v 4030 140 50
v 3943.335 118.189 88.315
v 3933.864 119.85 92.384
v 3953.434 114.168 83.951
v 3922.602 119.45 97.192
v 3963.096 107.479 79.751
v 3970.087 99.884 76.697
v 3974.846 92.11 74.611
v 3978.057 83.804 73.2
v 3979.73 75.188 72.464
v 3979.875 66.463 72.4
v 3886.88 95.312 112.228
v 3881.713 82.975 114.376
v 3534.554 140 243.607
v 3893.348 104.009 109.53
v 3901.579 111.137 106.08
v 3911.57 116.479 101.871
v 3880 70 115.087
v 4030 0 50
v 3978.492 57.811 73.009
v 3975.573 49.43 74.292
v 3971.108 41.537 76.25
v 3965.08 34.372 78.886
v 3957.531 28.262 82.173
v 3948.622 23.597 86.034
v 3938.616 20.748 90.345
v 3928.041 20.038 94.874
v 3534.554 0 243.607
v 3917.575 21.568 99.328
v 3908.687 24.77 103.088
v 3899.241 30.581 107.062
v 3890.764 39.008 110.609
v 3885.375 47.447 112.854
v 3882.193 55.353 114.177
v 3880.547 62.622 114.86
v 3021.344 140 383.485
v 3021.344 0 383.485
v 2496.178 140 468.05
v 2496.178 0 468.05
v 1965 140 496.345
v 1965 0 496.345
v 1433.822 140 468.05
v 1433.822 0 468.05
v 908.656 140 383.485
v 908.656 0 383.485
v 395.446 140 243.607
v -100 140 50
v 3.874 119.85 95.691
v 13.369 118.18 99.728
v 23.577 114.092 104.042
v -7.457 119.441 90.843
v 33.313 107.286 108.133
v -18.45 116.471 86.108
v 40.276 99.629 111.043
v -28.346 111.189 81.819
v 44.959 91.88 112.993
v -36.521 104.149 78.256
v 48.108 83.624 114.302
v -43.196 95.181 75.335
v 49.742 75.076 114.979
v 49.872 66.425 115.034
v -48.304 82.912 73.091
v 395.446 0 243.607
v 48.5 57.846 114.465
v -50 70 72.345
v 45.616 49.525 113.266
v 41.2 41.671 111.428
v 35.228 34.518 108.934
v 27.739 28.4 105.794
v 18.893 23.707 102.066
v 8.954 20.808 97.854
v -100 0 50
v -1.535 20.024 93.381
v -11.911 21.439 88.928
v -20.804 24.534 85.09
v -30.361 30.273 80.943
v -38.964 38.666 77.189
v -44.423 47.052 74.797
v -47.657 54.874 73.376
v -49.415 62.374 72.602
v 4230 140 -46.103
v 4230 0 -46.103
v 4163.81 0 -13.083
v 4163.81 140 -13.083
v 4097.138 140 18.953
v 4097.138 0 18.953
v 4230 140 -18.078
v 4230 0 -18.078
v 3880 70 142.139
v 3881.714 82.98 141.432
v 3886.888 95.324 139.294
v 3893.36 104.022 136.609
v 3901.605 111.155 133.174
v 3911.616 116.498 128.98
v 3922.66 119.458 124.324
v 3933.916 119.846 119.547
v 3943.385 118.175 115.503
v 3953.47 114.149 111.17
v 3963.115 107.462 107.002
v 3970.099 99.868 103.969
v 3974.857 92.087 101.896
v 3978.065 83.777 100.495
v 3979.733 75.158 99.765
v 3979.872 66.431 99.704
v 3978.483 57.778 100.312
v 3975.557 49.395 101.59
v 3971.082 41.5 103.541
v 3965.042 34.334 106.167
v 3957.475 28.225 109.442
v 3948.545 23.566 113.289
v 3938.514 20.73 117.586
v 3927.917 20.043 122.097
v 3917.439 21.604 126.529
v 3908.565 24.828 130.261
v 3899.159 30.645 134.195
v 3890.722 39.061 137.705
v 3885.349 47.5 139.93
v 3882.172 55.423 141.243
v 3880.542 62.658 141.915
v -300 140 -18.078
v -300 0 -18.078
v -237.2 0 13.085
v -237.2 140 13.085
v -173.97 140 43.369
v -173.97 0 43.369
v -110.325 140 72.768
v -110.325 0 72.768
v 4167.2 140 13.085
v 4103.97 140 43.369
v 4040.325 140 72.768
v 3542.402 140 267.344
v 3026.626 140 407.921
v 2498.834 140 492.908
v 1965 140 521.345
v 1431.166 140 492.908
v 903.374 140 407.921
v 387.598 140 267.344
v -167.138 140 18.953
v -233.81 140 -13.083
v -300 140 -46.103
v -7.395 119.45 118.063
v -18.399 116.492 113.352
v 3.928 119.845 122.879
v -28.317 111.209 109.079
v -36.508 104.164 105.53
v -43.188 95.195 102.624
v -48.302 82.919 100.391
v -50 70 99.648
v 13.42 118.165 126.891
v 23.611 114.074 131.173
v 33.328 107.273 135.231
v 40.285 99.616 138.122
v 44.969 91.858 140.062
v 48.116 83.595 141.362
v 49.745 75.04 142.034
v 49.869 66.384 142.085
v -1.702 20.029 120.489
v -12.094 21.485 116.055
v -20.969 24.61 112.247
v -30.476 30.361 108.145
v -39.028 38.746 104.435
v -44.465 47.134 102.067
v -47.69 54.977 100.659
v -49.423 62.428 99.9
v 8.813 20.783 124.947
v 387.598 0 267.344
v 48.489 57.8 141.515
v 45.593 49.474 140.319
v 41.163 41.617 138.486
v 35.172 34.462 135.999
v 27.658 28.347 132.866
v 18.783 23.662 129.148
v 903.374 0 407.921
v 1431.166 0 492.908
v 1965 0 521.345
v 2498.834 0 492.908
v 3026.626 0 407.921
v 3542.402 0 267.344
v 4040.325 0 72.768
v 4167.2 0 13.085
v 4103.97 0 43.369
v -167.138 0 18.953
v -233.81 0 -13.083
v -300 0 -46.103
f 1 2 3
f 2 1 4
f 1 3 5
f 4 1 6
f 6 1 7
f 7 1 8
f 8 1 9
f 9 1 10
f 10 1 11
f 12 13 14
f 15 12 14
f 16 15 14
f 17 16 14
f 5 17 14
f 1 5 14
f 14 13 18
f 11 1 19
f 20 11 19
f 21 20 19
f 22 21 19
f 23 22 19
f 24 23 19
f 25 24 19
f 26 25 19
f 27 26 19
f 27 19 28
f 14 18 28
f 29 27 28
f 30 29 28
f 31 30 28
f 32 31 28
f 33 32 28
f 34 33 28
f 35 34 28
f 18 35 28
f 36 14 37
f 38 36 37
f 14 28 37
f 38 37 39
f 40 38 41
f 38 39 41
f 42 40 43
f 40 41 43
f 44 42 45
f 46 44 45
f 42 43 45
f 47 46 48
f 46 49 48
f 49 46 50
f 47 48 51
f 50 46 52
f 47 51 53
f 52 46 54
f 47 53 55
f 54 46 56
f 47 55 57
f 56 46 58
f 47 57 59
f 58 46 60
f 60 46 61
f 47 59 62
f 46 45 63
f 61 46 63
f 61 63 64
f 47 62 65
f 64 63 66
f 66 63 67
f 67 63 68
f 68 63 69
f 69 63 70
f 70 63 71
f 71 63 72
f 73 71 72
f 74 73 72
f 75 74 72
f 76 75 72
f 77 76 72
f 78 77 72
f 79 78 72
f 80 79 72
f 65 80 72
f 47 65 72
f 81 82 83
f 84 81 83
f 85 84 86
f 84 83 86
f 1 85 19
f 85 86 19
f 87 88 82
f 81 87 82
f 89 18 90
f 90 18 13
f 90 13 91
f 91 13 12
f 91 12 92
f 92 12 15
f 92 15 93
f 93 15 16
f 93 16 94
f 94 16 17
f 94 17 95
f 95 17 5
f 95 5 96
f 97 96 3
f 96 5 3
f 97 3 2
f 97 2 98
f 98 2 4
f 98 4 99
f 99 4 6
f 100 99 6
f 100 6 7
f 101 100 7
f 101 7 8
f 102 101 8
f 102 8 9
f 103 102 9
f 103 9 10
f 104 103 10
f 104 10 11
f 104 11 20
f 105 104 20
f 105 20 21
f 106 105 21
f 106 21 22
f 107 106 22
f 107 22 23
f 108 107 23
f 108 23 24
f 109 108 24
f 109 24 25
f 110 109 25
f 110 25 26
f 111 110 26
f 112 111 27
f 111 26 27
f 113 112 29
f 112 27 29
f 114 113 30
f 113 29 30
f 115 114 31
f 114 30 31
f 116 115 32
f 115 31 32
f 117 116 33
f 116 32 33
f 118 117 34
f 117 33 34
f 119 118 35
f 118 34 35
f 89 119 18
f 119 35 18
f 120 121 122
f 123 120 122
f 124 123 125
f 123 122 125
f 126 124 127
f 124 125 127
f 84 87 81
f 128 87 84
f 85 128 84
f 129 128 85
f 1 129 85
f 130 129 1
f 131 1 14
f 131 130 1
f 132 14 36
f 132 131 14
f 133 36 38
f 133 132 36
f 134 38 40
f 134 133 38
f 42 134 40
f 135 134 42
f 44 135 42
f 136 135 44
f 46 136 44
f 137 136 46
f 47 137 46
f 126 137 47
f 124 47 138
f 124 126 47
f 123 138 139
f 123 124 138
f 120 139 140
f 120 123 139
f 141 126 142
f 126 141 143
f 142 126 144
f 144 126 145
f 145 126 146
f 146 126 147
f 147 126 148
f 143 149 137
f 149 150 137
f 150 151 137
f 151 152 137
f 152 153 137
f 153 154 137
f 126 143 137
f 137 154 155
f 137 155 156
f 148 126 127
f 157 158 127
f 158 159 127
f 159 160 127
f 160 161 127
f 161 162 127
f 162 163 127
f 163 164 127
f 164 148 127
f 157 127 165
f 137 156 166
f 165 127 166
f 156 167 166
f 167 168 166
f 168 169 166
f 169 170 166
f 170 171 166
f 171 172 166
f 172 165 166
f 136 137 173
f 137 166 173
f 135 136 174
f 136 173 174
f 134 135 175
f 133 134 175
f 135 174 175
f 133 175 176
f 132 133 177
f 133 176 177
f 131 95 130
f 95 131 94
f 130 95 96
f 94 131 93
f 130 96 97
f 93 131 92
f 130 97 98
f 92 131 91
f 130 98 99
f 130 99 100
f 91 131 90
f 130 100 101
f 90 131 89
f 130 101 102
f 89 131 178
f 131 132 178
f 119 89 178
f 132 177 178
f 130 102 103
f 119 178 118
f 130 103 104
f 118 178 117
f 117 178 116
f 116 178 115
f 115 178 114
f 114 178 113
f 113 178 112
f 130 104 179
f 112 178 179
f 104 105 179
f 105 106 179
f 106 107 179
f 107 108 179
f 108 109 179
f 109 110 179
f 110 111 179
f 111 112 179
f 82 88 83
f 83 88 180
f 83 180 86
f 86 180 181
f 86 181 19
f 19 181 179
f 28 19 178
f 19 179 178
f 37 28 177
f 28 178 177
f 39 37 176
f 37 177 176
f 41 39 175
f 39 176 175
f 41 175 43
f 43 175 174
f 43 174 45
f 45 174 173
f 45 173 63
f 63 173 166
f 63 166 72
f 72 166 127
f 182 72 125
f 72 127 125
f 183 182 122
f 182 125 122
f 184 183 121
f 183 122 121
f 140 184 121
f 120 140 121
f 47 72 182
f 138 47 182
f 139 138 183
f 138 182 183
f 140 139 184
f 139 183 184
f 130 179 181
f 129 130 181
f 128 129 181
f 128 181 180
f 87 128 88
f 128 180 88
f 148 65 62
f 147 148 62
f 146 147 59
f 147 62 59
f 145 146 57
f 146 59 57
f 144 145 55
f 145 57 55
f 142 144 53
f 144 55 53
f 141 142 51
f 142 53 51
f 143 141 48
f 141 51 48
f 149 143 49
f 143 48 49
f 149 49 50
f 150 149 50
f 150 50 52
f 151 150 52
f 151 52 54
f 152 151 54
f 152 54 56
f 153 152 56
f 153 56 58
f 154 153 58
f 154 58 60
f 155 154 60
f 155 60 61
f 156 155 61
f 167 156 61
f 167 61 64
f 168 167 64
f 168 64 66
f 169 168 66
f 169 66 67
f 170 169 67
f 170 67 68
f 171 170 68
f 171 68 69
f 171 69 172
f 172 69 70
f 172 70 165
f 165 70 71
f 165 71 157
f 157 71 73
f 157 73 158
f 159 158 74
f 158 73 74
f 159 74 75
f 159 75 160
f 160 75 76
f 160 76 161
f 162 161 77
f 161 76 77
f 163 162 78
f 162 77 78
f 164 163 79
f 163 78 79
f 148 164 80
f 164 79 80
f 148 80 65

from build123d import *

# Parameters (mm, degrees)
SKETCH1_W           = 3930
SKETCH1_H           = 140
BOSS_EXTRUDE1_DEPTH = 50
SKETCH2_R           = 50
CUT_EXTRUDE1_DEPTH  = 50
SKETCH3_W           = 100
SKETCH3_H           = 140
BOSS_EXTRUDE2_DEPTH = 50
SKETCH4_R           = 50
CUT_EXTRUDE2_DEPTH  = 51
BOSS_EXTRUDE3_DEPTH = 140
SKETCH6_R           = 50
CUT_EXTRUDE3_DEPTH  = 522.344874719
SKETCH7_W           = 4130
SKETCH7_H           = 50
CUT_EXTRUDE4_DEPTH  = 141.0000001


with BuildPart() as part:
    # Sketch1 → Boss-Extrude1 (new body)
    with BuildSketch(Plane.XY):
        with Locations((1965, 70)):
            Rectangle(SKETCH1_W, SKETCH1_H)
    extrude(amount=BOSS_EXTRUDE1_DEPTH)

    # Sketch2 → Cut-Extrude1 (cut)
    with BuildSketch(Plane.XY.offset(50)):
        with Locations((3930, 70)):
            Circle(SKETCH2_R)
        with Locations((0, 70)):
            Circle(SKETCH2_R)
    extrude(amount=-CUT_EXTRUDE1_DEPTH, mode=Mode.SUBTRACT)

    # Sketch3 → Boss-Extrude2 (add, through all)
    with BuildSketch(Plane(origin=(0, 0, 0), x_dir=(-1, 0, 0), z_dir=(0, 0, -1))):
        with Locations((-3980, 70)):
            Rectangle(SKETCH3_W, SKETCH3_H)
        with Locations((50, 70)):
            Rectangle(SKETCH3_W, SKETCH3_H)
    extrude(amount=-BOSS_EXTRUDE2_DEPTH)

    # Sketch4 → Cut-Extrude2 (cut, through all)
    with BuildSketch(Plane(origin=(0, 0, 0), x_dir=(-1, 0, 0), z_dir=(0, 0, -1))):
        with Locations((0, 70)):
            Circle(SKETCH4_R)
        with Locations((-3930, 70)):
            Circle(SKETCH4_R)
    extrude(amount=-CUT_EXTRUDE2_DEPTH, mode=Mode.SUBTRACT)

    # Sketch7 → Cut-Extrude4 (cut, through all)
    with BuildSketch(Plane(origin=(0, 140, 0), x_dir=(1, 0, 0), z_dir=(0, 1, 0))):
        with Locations((1965, -25)):
            Rectangle(SKETCH7_W, SKETCH7_H)
    extrude(amount=-CUT_EXTRUDE4_DEPTH, mode=Mode.SUBTRACT)


with BuildPart() as body_2:
    # Sketch5 → Boss-Extrude3 (new body, through all)
    with BuildSketch(Plane.XZ):
        with BuildLine():
            Line((-300, -46.10254567), (-300, -18.078239305))
            ThreePointArc((-300, -18.078239305), (-205.637820717, 28.337422294), (-110.325, 72.768275626))
            ThreePointArc((-110.325, 72.768275626), (1965, 521.344874719), (4040.325, 72.768275626))
            ThreePointArc((4040.325, 72.768275626), (4135.637820717, 28.337422294), (4230, -18.078239305))
            Line((4230, -18.078239305), (4230, -46.10254567))
            ThreePointArc((4230, -46.10254567), (4130.533173337, 3.0583197), (4030, 50))
            ThreePointArc((4030, 50), (1965, 496.344874719), (-100, 50))
            ThreePointArc((-100, 50), (-200.533173337, 3.0583197), (-300, -46.10254567))
        make_face()
    extrude(amount=-BOSS_EXTRUDE3_DEPTH)

    # Sketch6 → Cut-Extrude3 (cut, through all)
    with BuildSketch(Plane(origin=(0, 0, 0), x_dir=(-1, 0, 0), z_dir=(0, 0, -1))):
        with Locations((-3930, 70)):
            Circle(SKETCH6_R)
        with Locations((0, 70)):
            Circle(SKETCH6_R)
    extrude(amount=-CUT_EXTRUDE3_DEPTH, mode=Mode.SUBTRACT)


solid = body_2.part
